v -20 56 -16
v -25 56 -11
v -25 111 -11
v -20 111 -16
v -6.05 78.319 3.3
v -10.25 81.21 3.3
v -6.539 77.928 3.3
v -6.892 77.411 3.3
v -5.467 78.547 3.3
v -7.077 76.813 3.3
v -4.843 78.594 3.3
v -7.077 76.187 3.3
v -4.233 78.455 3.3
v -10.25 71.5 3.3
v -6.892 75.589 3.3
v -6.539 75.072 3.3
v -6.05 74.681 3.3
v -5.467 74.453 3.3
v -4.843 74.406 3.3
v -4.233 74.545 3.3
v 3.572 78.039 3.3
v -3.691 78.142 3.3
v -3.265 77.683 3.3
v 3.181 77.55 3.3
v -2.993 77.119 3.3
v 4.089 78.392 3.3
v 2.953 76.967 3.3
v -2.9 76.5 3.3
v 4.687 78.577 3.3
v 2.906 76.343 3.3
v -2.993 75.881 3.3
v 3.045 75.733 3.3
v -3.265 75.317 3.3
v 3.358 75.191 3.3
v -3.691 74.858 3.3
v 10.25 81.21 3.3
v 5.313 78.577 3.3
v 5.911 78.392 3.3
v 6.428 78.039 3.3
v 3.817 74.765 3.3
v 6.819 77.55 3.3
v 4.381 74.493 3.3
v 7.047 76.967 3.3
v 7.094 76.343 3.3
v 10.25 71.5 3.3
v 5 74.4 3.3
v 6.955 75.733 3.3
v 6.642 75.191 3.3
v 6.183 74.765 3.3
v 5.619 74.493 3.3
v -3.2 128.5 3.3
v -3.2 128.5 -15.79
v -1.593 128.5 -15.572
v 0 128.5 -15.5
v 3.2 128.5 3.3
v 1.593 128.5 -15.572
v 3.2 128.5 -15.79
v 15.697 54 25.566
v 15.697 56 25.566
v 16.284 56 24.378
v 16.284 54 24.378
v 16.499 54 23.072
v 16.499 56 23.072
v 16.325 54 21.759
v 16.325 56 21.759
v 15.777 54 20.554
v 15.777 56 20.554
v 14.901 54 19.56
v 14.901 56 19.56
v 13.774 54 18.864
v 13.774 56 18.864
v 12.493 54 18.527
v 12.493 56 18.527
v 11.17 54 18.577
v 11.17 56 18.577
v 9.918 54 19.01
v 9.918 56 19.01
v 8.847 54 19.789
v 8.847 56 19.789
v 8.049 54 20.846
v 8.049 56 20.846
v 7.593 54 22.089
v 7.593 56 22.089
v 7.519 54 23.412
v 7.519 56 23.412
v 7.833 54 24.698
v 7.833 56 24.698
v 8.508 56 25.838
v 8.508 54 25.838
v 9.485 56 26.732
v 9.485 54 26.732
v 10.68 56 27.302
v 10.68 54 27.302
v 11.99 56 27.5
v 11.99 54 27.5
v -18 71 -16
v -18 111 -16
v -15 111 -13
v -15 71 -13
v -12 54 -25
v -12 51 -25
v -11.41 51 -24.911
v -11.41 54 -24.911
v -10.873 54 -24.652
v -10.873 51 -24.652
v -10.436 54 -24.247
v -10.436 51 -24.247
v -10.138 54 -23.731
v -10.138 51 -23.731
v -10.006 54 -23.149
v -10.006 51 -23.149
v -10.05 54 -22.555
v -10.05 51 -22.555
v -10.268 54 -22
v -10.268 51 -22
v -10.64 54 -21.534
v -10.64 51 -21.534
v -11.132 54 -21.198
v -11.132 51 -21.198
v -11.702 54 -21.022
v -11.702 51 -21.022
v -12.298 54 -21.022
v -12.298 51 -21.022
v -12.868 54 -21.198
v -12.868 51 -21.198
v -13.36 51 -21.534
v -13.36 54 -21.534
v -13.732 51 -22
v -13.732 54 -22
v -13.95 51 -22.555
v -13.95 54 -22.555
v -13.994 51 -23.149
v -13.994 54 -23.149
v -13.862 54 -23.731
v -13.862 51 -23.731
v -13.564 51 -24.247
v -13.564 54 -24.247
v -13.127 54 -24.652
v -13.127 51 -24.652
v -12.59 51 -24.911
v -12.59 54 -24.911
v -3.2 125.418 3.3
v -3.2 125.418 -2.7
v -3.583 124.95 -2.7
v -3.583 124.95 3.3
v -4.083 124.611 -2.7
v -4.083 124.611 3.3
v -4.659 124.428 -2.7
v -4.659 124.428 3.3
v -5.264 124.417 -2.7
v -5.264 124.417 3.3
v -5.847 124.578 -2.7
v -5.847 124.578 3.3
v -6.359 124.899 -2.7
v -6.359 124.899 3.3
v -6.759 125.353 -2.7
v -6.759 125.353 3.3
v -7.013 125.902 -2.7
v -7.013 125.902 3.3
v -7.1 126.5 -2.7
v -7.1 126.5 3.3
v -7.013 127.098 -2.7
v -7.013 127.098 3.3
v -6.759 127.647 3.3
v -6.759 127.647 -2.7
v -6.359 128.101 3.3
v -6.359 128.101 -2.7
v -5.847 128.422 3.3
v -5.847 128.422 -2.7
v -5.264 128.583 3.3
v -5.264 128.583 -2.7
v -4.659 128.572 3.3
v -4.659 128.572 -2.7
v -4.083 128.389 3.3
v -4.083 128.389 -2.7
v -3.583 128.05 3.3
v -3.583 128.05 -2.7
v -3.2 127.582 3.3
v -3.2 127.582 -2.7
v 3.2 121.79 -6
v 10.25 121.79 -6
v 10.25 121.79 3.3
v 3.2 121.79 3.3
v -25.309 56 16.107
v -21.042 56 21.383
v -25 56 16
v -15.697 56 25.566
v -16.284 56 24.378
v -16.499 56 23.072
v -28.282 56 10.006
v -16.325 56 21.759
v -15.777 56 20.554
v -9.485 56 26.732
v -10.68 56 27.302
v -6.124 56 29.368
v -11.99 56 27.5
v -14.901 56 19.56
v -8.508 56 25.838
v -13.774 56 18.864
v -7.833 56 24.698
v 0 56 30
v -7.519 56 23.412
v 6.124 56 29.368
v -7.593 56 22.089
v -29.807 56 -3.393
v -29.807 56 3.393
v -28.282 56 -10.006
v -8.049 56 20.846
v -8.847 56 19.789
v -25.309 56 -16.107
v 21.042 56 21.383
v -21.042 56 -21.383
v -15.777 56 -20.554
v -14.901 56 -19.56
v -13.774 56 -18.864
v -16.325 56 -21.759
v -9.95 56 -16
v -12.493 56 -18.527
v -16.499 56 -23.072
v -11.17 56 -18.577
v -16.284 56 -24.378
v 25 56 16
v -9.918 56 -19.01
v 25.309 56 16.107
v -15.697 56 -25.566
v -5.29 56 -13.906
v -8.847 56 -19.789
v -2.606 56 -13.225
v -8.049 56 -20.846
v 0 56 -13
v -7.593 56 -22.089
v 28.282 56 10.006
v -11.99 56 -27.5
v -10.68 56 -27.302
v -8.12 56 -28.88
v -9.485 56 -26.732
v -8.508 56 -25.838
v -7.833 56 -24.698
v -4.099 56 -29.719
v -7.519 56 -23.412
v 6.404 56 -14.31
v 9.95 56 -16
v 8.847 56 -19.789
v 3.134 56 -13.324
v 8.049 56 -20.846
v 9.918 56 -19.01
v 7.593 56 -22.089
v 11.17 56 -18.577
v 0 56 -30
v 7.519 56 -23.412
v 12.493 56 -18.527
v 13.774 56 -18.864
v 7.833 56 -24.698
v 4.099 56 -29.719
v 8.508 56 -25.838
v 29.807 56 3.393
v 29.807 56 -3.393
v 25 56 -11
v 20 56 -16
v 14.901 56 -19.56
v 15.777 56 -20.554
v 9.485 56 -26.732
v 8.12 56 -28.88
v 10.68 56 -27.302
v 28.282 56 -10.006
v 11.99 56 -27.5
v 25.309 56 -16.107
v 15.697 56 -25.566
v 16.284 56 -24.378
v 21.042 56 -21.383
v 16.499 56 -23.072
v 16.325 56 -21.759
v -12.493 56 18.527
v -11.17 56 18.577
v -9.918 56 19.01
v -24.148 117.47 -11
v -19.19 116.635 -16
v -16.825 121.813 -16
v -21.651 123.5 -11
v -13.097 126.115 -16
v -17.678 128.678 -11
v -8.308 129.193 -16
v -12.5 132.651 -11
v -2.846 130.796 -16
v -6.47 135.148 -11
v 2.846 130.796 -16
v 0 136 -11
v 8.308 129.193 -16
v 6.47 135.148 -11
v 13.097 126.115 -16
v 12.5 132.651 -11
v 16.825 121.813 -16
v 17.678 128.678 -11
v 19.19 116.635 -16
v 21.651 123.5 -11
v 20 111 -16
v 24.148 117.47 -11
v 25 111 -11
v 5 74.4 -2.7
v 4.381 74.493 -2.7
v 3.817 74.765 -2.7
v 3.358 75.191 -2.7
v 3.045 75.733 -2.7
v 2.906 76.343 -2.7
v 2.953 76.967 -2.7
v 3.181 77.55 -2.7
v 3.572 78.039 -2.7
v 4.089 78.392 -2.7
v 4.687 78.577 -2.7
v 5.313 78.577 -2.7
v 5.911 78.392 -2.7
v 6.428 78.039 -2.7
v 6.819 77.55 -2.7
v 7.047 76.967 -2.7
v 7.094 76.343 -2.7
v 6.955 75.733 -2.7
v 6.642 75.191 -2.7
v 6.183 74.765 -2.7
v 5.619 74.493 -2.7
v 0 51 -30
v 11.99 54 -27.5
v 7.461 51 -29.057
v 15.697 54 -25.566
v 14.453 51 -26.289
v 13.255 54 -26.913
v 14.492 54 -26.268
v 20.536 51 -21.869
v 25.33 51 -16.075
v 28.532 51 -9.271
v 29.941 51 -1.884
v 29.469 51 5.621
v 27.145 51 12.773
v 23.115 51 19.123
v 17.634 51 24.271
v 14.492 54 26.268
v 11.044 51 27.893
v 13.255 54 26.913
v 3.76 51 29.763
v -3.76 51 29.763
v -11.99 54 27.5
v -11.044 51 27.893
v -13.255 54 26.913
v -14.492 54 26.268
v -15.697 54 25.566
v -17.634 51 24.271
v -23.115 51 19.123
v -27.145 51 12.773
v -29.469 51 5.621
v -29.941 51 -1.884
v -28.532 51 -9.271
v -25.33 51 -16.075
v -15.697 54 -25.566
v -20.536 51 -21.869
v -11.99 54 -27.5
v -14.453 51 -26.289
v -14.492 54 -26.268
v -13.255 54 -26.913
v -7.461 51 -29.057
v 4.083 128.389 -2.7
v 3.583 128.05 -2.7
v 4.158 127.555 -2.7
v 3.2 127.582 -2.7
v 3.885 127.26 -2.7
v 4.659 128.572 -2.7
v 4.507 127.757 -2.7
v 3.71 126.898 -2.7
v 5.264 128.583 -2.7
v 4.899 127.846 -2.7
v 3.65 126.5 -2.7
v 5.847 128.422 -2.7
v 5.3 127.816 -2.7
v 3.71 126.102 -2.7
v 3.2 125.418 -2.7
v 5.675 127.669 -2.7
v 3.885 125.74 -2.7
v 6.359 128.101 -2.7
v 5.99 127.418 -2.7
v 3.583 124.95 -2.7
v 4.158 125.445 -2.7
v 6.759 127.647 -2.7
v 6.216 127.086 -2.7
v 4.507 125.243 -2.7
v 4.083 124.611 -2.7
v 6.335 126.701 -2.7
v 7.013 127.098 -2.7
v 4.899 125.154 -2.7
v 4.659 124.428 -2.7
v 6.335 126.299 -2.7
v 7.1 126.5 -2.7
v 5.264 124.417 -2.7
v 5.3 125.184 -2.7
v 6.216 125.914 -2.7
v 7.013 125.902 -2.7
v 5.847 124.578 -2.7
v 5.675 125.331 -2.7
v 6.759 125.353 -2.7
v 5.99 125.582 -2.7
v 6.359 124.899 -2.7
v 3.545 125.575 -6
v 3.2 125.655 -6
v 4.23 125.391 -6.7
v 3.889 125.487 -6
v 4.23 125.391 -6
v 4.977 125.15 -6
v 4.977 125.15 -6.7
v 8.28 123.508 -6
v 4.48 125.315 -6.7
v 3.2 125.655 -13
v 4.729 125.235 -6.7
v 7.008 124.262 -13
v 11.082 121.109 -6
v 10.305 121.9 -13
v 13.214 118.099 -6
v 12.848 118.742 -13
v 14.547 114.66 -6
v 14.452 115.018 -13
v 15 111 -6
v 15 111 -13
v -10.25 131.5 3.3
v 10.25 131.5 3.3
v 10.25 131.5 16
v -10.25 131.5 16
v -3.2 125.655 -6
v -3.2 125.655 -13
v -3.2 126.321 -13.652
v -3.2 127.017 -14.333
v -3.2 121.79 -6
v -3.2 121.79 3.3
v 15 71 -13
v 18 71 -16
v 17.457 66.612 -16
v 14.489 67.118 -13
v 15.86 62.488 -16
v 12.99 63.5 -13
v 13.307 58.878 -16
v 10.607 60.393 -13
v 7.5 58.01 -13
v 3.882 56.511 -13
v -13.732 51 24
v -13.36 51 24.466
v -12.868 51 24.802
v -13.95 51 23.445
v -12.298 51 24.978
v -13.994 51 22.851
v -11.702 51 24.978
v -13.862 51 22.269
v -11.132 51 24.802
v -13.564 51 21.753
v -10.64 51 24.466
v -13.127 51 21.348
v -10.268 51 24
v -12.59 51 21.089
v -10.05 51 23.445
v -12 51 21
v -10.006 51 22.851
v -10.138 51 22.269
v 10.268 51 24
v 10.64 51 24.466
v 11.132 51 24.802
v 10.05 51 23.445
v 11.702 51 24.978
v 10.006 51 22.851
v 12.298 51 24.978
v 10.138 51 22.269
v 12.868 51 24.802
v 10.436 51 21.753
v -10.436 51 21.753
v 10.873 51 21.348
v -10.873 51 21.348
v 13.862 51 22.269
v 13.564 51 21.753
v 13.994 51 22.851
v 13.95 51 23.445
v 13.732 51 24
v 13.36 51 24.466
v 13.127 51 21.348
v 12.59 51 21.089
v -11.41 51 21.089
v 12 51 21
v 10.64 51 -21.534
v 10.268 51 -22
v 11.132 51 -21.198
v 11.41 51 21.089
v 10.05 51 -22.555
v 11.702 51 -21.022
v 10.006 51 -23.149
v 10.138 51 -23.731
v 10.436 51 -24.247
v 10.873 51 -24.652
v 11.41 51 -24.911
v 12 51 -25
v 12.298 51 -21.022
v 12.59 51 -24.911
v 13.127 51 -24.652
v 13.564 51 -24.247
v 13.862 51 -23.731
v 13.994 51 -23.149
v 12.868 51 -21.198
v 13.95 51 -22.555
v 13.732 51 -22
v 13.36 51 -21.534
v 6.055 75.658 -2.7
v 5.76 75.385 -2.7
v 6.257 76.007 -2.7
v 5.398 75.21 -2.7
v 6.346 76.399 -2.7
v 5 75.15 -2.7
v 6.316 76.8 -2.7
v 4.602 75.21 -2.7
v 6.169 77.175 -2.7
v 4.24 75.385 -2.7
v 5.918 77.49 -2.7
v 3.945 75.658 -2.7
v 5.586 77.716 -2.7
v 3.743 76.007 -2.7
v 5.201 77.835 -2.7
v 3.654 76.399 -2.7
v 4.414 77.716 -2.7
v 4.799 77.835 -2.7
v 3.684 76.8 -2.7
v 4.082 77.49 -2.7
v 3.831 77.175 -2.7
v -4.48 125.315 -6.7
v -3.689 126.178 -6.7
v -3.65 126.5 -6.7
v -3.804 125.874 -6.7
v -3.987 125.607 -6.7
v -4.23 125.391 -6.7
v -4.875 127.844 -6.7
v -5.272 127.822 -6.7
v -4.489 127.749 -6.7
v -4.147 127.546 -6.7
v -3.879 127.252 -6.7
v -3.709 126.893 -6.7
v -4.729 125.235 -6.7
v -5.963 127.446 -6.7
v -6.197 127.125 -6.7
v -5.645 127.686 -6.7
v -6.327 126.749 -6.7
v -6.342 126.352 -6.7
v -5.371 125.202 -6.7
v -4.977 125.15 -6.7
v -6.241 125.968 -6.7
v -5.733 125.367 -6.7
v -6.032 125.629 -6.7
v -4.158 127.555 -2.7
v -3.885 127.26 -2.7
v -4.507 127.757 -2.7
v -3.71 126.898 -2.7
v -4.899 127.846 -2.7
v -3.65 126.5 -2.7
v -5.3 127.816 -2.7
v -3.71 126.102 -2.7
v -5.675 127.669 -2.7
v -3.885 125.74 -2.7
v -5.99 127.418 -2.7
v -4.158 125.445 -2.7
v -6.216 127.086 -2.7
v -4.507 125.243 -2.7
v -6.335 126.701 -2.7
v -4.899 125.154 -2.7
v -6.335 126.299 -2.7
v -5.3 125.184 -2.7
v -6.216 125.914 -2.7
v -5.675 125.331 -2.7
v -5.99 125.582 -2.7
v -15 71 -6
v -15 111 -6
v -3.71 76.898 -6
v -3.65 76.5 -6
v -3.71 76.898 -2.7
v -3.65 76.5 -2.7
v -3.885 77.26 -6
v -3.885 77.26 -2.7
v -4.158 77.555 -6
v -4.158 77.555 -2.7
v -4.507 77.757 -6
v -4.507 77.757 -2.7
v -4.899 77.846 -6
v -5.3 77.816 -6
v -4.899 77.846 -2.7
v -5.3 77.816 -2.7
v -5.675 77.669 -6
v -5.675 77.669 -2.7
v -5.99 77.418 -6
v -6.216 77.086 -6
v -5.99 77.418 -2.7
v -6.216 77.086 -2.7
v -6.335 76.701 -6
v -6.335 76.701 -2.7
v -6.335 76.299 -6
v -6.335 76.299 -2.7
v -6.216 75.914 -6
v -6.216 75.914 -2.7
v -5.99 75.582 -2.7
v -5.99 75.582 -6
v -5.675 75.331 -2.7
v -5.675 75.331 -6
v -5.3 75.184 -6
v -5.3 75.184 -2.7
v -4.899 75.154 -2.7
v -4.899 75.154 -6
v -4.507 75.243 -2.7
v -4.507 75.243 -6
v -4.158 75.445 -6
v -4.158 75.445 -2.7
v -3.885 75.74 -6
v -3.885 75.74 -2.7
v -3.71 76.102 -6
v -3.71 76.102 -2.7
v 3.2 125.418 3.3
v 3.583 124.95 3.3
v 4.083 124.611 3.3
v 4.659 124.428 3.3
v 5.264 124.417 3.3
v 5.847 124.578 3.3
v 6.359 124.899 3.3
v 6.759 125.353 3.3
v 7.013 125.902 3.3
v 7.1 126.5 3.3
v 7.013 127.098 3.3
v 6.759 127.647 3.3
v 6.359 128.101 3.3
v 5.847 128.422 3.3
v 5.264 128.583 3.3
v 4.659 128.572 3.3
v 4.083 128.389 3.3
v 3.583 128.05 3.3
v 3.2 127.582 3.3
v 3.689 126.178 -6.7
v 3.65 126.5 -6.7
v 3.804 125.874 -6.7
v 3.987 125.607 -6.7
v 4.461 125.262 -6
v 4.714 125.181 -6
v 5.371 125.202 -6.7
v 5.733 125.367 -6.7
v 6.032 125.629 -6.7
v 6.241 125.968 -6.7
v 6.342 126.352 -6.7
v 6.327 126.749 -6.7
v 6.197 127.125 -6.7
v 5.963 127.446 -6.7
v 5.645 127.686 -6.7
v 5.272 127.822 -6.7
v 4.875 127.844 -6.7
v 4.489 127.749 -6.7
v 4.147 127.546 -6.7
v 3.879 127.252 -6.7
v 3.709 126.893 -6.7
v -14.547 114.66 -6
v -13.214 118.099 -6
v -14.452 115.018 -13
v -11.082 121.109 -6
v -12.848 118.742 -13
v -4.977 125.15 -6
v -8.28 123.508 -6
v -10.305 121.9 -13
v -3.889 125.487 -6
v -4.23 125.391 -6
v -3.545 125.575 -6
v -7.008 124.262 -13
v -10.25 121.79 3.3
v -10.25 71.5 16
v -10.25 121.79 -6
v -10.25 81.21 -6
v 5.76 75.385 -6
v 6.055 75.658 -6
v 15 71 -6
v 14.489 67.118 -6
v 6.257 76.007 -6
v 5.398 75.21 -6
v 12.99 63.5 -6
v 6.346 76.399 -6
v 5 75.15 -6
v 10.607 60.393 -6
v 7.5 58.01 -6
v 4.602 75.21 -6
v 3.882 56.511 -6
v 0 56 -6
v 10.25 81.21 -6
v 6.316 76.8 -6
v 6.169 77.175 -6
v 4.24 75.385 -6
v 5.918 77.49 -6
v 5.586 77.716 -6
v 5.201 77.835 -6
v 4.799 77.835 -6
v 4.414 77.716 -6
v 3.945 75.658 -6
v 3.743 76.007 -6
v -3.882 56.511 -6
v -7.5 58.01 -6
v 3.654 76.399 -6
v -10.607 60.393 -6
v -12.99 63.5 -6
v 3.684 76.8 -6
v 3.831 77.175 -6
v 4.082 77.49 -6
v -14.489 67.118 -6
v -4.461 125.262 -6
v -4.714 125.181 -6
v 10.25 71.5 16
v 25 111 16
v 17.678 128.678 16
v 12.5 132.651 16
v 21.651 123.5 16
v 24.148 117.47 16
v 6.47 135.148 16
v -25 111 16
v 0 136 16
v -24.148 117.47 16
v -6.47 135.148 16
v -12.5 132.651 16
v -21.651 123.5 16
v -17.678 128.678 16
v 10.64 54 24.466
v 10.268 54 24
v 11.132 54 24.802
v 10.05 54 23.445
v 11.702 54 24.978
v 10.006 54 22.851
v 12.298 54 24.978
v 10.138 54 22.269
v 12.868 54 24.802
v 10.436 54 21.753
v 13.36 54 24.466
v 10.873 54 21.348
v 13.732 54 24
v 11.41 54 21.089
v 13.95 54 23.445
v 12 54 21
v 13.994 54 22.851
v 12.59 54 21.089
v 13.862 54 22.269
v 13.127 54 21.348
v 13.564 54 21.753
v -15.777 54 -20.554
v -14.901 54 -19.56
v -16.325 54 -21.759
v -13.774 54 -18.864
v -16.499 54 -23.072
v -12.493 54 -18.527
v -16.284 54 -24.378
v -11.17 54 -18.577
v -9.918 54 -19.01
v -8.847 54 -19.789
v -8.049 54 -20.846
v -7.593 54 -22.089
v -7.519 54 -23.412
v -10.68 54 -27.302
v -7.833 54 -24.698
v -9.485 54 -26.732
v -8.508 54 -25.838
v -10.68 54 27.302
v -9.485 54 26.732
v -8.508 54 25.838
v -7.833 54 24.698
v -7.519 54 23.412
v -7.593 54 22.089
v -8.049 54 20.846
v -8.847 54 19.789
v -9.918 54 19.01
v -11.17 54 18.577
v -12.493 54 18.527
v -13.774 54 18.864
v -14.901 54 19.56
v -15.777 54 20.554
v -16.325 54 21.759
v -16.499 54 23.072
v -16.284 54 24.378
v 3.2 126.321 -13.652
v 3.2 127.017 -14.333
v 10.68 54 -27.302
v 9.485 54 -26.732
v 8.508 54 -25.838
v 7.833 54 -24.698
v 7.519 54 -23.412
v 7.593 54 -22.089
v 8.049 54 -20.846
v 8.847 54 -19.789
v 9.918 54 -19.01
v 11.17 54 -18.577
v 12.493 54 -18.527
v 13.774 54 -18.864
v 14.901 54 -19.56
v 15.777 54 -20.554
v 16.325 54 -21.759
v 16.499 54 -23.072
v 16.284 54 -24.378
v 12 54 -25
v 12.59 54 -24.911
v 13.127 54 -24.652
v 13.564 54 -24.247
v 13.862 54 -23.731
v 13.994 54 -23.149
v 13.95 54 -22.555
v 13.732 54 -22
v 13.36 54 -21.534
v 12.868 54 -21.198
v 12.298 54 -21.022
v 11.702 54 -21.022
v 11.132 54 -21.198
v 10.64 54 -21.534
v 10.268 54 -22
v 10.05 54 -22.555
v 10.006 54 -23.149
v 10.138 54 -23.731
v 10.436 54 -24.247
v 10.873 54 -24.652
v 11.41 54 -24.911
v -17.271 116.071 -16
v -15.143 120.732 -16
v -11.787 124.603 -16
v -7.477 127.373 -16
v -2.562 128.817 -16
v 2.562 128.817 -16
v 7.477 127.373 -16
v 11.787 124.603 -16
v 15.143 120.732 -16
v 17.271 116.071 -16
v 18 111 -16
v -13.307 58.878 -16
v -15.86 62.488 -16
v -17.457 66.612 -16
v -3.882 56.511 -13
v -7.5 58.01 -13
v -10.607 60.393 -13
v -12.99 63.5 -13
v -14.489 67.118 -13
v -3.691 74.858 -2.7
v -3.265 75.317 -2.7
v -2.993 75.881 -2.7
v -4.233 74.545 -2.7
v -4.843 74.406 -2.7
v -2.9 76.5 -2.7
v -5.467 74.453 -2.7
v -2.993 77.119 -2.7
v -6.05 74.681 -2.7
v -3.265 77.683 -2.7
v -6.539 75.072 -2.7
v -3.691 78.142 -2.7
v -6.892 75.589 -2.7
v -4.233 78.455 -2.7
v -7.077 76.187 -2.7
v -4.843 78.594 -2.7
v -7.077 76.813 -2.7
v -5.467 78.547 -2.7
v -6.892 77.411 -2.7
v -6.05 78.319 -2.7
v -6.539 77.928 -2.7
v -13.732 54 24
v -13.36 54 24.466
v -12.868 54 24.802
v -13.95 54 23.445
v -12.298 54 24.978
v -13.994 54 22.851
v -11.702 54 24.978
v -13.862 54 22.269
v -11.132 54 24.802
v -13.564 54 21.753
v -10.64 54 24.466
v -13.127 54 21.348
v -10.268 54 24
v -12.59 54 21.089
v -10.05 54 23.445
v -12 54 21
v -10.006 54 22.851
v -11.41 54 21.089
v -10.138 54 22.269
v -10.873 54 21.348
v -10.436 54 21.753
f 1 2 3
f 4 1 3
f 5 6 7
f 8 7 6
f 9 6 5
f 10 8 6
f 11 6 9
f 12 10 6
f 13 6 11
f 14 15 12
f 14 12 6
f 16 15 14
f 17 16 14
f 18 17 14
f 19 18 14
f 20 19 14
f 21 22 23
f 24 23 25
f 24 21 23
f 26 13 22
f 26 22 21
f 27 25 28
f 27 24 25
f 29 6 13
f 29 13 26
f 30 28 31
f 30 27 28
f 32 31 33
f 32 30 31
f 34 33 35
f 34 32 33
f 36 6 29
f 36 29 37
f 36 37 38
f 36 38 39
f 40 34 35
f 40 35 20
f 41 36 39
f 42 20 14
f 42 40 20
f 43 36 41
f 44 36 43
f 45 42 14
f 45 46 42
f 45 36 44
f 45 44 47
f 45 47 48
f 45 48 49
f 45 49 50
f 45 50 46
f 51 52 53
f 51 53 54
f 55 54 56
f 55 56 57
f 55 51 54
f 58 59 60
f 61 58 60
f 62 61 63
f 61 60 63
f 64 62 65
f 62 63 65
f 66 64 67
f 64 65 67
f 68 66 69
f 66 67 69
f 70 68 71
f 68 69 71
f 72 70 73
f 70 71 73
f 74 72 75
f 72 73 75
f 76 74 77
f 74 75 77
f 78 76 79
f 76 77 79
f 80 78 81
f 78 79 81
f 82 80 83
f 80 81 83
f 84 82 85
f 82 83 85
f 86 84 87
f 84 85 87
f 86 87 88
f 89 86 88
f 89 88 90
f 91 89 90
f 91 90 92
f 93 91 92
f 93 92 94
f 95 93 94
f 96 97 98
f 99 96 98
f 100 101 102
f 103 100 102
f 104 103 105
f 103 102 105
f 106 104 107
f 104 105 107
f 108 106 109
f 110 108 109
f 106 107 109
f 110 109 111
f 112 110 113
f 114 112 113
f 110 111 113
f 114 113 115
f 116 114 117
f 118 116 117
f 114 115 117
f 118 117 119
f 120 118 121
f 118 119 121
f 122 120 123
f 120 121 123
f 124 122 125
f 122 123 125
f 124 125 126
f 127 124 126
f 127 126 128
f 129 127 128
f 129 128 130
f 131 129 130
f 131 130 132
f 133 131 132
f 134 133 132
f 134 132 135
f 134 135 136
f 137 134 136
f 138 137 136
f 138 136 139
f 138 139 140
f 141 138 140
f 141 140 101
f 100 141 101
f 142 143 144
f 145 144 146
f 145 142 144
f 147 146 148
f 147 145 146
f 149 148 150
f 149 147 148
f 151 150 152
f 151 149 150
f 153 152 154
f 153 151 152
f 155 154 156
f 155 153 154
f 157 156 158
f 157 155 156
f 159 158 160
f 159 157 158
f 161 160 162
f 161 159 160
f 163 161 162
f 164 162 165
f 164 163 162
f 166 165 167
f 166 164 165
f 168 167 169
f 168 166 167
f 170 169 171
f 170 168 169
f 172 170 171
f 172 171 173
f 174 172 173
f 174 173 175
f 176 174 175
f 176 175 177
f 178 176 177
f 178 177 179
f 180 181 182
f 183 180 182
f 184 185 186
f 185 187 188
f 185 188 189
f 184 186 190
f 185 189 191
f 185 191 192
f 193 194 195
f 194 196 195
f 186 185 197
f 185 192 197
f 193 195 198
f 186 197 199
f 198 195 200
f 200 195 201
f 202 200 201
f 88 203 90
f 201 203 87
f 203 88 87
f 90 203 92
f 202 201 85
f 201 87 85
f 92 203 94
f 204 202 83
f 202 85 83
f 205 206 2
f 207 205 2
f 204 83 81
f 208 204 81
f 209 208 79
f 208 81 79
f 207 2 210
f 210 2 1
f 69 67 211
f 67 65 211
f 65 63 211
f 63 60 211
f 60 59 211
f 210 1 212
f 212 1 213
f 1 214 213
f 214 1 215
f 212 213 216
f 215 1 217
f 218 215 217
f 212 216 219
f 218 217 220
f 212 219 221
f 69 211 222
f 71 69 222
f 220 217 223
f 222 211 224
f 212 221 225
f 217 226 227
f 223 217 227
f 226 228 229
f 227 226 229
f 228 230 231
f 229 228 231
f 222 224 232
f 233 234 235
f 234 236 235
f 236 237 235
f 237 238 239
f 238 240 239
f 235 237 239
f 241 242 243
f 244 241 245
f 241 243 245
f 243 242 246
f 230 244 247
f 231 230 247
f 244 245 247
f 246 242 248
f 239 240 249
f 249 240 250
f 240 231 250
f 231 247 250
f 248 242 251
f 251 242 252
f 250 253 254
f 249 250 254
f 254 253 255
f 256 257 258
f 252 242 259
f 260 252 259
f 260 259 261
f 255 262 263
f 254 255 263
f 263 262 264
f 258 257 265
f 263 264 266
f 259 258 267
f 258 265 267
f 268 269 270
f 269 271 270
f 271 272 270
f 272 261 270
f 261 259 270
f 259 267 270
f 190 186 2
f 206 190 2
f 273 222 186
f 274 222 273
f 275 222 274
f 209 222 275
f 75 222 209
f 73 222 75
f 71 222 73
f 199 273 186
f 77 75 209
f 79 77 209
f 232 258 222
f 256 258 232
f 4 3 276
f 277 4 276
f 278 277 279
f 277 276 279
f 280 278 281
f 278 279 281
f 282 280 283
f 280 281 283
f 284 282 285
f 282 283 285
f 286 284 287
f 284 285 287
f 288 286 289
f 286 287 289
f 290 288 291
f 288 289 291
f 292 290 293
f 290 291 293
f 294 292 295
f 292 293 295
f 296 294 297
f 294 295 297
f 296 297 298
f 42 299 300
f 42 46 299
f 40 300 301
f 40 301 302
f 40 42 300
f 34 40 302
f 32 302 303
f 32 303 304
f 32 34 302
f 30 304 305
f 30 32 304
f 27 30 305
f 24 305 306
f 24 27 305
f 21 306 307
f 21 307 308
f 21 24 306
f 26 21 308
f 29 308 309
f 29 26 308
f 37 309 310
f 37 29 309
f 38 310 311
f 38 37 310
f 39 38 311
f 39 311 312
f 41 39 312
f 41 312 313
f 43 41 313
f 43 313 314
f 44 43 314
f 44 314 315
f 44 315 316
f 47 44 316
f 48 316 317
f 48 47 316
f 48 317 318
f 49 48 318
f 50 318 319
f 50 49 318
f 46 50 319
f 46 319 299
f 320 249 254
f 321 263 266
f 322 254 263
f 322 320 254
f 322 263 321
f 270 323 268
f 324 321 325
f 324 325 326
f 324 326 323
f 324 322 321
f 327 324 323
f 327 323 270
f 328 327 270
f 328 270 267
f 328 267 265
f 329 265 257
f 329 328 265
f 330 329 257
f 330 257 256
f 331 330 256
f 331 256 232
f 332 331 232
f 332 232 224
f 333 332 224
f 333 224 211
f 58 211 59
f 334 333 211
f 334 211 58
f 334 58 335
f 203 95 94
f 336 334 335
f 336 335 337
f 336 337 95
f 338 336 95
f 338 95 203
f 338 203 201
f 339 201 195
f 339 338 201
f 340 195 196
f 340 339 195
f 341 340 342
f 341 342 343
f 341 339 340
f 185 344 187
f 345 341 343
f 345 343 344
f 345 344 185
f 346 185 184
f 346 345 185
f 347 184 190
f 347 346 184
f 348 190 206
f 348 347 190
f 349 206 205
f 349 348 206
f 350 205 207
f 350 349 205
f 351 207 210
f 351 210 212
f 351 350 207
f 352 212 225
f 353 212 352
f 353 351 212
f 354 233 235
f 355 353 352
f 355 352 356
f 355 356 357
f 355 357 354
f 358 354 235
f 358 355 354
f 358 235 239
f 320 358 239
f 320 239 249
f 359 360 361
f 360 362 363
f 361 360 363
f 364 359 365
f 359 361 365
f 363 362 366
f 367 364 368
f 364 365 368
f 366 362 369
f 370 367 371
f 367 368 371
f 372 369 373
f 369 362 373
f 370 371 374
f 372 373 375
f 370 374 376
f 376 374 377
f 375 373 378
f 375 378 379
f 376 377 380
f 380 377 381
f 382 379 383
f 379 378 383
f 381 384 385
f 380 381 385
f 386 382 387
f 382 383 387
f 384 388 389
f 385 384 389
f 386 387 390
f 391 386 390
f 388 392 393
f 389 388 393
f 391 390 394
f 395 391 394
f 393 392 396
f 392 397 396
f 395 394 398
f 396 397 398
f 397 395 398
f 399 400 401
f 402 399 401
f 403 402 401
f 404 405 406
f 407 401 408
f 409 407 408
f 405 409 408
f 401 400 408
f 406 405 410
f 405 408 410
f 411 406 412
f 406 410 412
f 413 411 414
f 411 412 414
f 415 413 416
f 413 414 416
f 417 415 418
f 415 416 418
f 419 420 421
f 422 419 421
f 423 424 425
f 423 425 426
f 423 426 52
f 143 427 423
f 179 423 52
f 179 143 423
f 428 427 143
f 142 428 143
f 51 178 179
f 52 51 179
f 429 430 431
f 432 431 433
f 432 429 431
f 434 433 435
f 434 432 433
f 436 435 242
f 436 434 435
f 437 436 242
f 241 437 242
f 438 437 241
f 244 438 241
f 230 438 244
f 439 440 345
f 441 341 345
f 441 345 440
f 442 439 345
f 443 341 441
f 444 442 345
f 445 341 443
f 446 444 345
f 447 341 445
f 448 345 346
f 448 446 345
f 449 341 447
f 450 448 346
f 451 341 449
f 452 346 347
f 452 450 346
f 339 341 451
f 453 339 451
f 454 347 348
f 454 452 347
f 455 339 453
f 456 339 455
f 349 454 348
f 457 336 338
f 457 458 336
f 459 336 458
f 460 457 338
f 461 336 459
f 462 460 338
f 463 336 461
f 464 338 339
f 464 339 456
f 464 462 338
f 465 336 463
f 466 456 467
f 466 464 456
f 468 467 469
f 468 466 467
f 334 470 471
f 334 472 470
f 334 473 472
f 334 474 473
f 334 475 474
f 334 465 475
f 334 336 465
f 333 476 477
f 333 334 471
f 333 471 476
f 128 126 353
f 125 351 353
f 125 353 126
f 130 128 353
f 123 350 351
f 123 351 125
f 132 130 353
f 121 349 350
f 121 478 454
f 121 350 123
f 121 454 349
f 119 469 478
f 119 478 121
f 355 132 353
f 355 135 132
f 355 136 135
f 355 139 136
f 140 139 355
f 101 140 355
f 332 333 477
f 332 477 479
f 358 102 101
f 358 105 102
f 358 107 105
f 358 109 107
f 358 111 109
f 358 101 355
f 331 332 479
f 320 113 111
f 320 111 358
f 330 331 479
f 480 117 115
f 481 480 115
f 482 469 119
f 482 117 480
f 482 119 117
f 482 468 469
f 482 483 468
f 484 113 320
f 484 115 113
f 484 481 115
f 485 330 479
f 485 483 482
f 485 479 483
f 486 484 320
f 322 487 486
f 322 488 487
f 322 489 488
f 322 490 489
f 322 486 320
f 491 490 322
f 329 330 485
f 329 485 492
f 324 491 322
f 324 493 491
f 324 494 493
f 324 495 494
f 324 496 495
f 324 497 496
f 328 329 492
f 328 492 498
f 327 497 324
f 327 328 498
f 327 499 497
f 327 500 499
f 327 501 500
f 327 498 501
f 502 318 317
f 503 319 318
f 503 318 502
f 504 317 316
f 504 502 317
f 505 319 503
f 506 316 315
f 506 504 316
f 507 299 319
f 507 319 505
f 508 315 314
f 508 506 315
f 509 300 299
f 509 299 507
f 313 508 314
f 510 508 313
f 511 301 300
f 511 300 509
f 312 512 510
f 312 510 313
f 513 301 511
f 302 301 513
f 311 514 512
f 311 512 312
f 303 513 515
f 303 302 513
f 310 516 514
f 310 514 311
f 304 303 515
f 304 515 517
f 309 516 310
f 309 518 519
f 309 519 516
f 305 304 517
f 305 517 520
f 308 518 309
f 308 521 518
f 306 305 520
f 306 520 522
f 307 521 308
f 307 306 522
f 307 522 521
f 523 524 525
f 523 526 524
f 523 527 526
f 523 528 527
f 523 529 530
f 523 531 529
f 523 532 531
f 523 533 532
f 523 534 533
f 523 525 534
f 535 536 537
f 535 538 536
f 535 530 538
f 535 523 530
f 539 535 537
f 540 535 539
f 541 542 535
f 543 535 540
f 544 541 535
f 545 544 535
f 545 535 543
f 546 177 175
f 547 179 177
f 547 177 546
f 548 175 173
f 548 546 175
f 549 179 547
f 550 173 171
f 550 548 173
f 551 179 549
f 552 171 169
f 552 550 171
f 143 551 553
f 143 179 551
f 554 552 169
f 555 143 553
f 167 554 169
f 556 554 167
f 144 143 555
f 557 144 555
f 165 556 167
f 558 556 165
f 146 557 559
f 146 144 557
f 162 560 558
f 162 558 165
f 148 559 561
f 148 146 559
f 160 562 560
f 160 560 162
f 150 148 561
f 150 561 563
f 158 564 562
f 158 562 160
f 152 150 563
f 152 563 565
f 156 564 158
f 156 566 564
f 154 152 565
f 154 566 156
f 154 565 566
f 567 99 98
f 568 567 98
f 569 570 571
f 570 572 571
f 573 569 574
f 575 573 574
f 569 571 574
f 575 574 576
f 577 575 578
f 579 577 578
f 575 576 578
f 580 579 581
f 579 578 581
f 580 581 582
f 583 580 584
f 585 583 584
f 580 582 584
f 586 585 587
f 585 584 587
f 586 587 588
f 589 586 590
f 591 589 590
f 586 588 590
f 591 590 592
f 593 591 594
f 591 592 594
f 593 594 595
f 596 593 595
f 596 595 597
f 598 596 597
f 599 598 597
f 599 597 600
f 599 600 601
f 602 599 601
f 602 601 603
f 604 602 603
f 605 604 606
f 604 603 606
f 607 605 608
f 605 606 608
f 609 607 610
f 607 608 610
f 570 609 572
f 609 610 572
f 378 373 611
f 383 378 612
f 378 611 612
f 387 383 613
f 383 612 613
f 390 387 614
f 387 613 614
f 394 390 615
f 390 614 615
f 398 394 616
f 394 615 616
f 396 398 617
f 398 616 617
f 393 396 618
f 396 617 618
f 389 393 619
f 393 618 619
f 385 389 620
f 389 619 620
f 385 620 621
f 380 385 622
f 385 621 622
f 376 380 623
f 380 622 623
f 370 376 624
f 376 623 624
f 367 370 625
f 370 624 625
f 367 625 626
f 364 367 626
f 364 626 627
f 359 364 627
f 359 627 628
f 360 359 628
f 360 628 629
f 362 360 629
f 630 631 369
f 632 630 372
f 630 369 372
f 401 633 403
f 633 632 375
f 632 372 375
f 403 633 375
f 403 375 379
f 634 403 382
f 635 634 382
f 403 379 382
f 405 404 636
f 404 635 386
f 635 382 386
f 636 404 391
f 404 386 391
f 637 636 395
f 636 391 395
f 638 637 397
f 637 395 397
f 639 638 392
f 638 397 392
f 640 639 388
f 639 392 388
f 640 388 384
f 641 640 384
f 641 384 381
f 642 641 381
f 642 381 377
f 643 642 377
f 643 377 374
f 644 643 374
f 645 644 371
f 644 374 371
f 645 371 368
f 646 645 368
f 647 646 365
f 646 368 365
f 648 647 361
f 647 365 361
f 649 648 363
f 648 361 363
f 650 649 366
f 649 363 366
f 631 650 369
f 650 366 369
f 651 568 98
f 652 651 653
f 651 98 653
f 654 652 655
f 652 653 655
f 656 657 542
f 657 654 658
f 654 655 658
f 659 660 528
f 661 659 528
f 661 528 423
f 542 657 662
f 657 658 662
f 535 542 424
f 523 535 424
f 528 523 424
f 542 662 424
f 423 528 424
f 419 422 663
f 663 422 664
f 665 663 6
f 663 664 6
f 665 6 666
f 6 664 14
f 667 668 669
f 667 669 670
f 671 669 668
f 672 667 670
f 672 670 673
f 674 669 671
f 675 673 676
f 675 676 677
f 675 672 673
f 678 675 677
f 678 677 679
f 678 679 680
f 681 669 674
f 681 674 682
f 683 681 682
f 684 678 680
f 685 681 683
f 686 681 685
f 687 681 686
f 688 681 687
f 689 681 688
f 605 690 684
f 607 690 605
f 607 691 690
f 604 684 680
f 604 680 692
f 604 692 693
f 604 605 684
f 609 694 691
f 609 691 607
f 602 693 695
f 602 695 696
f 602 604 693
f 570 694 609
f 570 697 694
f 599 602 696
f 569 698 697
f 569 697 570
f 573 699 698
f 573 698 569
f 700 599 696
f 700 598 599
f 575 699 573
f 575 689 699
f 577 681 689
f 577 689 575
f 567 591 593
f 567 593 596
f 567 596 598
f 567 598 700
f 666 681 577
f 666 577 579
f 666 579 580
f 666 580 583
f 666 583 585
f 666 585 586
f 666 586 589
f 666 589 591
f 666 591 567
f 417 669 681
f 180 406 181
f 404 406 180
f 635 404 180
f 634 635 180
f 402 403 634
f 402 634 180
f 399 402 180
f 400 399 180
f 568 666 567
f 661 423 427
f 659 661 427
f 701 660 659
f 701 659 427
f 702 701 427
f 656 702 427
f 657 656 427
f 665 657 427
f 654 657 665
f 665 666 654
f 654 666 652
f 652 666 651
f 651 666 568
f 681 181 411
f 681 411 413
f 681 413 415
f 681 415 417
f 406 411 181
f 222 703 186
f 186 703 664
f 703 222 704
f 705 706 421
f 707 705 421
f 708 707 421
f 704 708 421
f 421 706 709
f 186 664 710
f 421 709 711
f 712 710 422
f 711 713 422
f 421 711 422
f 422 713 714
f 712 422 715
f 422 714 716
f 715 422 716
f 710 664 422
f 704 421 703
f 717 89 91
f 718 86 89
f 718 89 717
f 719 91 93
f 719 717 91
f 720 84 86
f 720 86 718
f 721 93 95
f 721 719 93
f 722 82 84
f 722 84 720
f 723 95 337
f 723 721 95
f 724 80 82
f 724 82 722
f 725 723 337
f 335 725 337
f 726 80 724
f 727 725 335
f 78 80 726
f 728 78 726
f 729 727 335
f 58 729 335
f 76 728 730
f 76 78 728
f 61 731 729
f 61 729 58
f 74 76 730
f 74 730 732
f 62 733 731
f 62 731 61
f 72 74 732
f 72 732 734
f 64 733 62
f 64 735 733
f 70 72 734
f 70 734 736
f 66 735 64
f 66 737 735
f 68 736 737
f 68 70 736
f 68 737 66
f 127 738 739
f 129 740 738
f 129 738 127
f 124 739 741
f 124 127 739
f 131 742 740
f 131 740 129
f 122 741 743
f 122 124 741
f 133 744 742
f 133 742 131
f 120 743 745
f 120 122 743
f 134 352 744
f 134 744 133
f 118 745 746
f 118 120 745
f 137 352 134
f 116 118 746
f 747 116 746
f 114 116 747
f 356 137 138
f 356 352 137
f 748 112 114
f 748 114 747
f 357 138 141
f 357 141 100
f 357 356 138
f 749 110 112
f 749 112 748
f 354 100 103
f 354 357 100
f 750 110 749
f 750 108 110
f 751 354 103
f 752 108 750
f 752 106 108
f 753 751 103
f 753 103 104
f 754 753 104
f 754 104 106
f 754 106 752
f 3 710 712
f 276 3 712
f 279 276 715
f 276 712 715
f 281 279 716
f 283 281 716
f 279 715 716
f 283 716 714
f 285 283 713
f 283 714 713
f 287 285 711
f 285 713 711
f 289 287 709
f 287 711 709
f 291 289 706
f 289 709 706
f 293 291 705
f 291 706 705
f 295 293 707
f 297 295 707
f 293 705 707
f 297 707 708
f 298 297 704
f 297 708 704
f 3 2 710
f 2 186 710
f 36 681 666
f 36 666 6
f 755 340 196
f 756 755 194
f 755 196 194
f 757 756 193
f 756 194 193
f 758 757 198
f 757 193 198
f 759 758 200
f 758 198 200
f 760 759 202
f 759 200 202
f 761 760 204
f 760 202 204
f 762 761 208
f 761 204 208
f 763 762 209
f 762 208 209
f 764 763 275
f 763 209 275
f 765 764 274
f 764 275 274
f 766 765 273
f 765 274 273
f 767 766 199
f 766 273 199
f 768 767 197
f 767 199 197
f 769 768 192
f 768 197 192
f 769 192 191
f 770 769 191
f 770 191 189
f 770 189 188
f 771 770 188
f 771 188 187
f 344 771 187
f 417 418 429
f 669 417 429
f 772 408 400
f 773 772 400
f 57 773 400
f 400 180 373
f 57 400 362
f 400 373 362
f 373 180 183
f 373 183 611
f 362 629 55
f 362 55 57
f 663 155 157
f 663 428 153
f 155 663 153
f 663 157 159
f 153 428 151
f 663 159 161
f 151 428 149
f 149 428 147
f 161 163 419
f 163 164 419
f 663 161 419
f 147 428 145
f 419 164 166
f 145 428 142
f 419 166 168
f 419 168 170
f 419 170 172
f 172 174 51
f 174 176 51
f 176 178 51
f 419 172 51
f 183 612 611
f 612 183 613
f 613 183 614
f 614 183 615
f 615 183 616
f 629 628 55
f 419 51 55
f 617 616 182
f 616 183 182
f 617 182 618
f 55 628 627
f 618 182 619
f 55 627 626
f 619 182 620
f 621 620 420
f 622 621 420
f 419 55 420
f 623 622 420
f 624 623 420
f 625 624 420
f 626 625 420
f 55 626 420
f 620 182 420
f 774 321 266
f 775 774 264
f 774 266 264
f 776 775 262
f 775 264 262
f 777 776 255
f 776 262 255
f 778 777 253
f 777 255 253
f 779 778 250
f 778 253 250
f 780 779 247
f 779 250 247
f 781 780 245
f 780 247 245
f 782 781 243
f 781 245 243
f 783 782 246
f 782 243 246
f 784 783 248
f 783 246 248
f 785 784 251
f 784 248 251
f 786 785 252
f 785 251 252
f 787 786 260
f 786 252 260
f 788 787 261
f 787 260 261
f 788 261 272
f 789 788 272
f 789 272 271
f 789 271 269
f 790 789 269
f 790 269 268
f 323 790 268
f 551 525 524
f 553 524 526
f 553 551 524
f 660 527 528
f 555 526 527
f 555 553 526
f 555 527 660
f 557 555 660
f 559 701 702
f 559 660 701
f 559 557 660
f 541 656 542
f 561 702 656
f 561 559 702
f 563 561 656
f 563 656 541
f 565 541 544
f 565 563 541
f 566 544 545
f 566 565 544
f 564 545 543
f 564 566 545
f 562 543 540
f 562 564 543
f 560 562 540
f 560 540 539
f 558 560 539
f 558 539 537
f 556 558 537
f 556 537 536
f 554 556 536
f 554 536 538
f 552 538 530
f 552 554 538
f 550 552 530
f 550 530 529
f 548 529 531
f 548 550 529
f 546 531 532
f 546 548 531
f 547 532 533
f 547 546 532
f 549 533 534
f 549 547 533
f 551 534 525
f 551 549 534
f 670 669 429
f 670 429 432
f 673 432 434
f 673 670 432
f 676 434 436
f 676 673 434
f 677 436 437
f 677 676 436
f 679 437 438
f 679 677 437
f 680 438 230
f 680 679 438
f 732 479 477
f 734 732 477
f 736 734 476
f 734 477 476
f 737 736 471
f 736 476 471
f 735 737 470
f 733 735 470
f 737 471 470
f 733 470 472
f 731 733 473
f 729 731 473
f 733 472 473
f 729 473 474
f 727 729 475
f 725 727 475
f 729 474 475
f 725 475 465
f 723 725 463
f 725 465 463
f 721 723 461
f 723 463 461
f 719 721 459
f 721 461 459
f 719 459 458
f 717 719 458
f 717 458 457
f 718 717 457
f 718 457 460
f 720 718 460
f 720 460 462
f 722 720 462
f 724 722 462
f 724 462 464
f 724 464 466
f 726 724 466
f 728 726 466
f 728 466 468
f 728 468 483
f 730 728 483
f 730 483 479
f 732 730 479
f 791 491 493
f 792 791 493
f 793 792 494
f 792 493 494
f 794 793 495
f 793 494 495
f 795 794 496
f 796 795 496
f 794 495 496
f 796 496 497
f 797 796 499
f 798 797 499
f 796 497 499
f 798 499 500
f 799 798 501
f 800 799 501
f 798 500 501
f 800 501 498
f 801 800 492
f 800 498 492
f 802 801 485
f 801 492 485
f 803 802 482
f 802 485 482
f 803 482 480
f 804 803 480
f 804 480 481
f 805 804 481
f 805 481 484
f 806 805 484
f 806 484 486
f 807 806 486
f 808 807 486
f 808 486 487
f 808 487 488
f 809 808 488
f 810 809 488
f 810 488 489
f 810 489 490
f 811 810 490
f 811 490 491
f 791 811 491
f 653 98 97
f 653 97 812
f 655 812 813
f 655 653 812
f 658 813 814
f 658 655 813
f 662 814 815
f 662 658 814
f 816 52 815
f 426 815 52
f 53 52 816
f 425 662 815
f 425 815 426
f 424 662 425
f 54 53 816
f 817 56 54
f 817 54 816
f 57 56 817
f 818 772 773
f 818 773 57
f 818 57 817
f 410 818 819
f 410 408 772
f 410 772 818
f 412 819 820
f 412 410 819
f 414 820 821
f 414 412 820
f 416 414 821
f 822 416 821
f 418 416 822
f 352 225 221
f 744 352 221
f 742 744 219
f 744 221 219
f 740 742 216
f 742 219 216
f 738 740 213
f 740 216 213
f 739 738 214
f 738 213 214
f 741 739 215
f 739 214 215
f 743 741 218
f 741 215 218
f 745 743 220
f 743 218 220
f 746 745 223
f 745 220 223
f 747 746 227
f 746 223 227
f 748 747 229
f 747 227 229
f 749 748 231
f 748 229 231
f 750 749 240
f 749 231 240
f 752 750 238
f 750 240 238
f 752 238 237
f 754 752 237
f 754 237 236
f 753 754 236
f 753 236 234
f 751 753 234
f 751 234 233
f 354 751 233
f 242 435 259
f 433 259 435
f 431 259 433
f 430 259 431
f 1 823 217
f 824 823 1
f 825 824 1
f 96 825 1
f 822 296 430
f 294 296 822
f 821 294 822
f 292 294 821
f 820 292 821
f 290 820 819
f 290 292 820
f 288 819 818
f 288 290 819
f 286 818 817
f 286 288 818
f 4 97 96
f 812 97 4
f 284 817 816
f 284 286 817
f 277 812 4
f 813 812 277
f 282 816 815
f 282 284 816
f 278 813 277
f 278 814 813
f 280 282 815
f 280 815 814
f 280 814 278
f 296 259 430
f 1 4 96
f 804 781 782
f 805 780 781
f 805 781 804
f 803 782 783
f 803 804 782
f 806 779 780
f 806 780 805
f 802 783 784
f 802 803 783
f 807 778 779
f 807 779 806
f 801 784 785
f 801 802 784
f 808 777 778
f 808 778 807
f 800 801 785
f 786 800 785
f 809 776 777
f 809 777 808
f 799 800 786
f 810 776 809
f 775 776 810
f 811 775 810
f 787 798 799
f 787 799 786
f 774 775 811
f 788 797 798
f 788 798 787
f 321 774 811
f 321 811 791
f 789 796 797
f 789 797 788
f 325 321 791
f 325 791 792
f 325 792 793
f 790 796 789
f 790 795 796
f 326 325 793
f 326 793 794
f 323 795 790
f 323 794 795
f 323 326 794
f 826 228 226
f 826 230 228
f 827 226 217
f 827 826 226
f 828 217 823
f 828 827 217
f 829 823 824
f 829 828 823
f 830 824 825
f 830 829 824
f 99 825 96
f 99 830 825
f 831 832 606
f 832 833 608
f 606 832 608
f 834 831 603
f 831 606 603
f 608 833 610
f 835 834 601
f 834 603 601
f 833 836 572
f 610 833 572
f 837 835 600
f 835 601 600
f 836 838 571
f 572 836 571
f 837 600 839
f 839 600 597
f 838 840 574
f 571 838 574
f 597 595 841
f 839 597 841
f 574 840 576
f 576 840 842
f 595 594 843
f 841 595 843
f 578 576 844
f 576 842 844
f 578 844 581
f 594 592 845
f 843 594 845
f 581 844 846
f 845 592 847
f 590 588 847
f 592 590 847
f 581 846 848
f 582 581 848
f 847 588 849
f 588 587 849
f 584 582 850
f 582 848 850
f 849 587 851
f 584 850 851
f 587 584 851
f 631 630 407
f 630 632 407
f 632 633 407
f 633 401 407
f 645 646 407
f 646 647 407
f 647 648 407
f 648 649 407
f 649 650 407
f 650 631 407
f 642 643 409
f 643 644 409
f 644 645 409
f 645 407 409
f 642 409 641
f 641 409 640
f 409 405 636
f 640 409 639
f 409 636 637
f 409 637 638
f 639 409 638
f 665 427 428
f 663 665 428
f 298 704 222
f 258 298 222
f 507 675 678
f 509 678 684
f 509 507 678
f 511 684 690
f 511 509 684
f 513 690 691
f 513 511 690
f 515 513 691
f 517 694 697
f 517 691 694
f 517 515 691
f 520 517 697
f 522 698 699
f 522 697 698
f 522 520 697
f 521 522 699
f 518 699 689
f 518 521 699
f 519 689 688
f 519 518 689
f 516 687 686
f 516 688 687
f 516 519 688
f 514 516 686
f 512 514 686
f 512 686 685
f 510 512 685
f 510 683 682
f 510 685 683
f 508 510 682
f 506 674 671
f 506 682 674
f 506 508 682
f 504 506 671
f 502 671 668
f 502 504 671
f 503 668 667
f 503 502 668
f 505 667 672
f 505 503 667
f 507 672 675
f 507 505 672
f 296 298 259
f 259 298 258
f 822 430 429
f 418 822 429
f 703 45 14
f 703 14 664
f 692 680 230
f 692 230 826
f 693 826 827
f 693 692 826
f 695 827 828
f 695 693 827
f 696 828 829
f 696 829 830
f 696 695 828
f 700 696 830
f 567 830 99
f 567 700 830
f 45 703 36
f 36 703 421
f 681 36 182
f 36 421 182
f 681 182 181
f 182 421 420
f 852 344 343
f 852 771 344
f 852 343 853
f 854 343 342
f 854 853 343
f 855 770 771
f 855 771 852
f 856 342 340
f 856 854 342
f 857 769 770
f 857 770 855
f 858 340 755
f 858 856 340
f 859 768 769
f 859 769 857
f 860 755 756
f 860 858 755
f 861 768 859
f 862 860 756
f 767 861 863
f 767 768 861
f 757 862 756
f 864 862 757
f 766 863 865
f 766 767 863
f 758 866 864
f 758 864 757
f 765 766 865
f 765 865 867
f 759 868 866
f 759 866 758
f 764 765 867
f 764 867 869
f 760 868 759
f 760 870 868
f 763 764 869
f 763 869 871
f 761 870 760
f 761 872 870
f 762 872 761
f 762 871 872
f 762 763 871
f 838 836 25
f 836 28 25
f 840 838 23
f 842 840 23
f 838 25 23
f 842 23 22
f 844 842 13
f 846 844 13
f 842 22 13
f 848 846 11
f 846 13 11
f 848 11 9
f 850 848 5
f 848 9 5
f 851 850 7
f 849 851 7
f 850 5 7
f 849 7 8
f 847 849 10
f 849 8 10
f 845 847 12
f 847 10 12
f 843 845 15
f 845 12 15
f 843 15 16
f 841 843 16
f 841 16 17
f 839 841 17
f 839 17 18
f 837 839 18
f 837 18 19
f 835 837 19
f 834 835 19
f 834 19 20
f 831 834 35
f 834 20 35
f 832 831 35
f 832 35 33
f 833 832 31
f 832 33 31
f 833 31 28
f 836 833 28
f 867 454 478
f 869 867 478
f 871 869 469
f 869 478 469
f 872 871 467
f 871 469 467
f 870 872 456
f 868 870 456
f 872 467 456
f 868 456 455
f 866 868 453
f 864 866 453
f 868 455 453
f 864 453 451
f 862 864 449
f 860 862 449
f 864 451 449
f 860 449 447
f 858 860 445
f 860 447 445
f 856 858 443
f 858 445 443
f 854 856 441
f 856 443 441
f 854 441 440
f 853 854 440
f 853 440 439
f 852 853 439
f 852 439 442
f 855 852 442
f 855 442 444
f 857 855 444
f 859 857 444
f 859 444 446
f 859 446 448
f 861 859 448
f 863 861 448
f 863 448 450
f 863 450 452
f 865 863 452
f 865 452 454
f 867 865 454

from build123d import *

# Parameters (mm, degrees)
BOSS_EXTRUDE1_DEPTH = 16
CHAMFER1_SIZE       = 5
CUT_EXTRUDE1_DEPTH  = 10.25
SKETCH5_W           = 6.4
SKETCH5_H           = 6.71
CUT_EXTRUDE2_DEPTH  = 24
CUT_EXTRUDE3_DEPTH  = 10
FILLET1_R           = 15
CHAMFER2_SIZE       = 3
SKETCH7_R           = 30
SKETCH7_R_2         = 2
BOSS_EXTRUDE2_DEPTH = 5
SKETCH8_R           = 4.5
CUT_EXTRUDE4_DEPTH  = 2


# Some blends are built 0.0001 mm under size
with BuildPart() as part:
    # Sketch1 → Boss-Extrude1 (new, symmetric)
    with BuildSketch(Plane.XY):
        with BuildLine():
            Line((25, 51), (-25, 51))
            Line((-25, 51), (-25, 111))
            ThreePointArc((-25, 111), (0, 136), (25, 111))
            Line((25, 111), (25, 51))
        make_face()
    extrude(amount=BOSS_EXTRUDE1_DEPTH, both=True)

    # Chamfer1
    chamfer1_edges = [part.edges().sort_by_distance(p)[0] for p in [
        (25, 81, -16),
        (-25, 81, -16),
        (0, 136, -16),
    ]]
    chamfer(chamfer1_edges, length=CHAMFER1_SIZE)

    # Sketch3 → Cut-Extrude1 (cut, symmetric)
    with BuildSketch(Plane(origin=(0, 0, 0), x_dir=(0, 0, -1), z_dir=(1, 0, 0))):
        Polygon((-3.3, 121.79), (-3.3, 131.5), (-16, 131.5), (-16, 101.5), (16, 101.5), (16, 121.79), align=None)
    cut_extrude1 = extrude(amount=CUT_EXTRUDE1_DEPTH, both=True, mode=Mode.SUBTRACT)

    # Sketch4 → Cut-Revolve1 (revolve, cut)
    with BuildSketch(Plane(origin=(-5, 0, 0), x_dir=(0, 0, -1), z_dir=(1, 0, 0)), mode=Mode.PRIVATE) as cut_revolve1_sk:
        Polygon((-3.3, 126.5), (6.7, 126.5), (6.7, 127.85), (2.7, 127.85), (2.7, 128.6), (-3.3, 128.6), align=None)
    cut_revolve1 = revolve(cut_revolve1_sk.sketch.rotate(Axis((-5, 126.5, 3.3), (0, 0, -1)), 90), axis=Axis((-5, 126.5, 3.3), (0, 0, -1)), mode=Mode.SUBTRACT)

    # Mirror1: Cut-Revolve1 across plane
    add(cut_revolve1.mirror(Plane(origin=(0, 0, 0), x_dir=(0, 0, 1), z_dir=(1, 0, 0))), mode=Mode.SUBTRACT)

    # Mirror2: Cut-Extrude1, Cut-Revolve1 across plane
    add(cut_extrude1.mirror(Plane(origin=(-10.25, 101.5, -16), x_dir=(0, 0, 1), z_dir=(0, -1, 0))), mode=Mode.SUBTRACT)
    add(cut_revolve1.mirror(Plane(origin=(-10.25, 101.5, -16), x_dir=(0, 0, 1), z_dir=(0, -1, 0))), mode=Mode.SUBTRACT)

    # Mirror2 copy 1 sketch → Mirror2 copy 1 (revolve, cut)
    with BuildSketch(Plane(origin=(5, 203, 0), x_dir=(0, 0, -1), z_dir=(-1, 0, 0))):
        Polygon((-3.3, 126.5), (6.7, 126.5), (6.7, 127.85), (2.7, 127.85), (2.7, 128.6), (-3.3, 128.6), align=None)
    revolve(axis=Axis((5, 76.5, 3.3), (0, 0, -1)), mode=Mode.SUBTRACT)

    # Sketch5 → Cut-Extrude2 (cut)
    with BuildSketch(Plane.XY.offset(3.3)):
        with Locations((0, 125.145)):
            Rectangle(SKETCH5_W, SKETCH5_H)
    extrude(amount=-CUT_EXTRUDE2_DEPTH, mode=Mode.SUBTRACT)

    # Sketch6 → Cut-Extrude3 (cut)
    with BuildSketch(Plane(origin=(0, 0, -16), x_dir=(-1, 0, 0), z_dir=(0, 0, -1))):
        with BuildLine():
            Line((-15, 111), (-15, 56))
            Line((-15, 56), (15, 56))
            Line((15, 56), (15, 111))
            ThreePointArc((15, 111), (0, 126), (-15, 111))
        make_face()
    extrude(amount=-CUT_EXTRUDE3_DEPTH, mode=Mode.SUBTRACT)

    # Fillet1
    fillet1_edges = [part.edges().sort_by_distance(p)[0] for p in [
        (-15, 56, -11),
        (15, 56, -11),
    ]]
    fillet(fillet1_edges, radius=FILLET1_R - 0.0001)  # a hair under: the kernel refuses the full size

    # Chamfer2
    # the kernel refuses this chamfer: 3 mm, written as the material it takes off along each edge
    with BuildSketch(Plane(origin=(-15, 70.9999, -16), x_dir=(-0.9996219169112965, 0, -0.02749587661058676), z_dir=(0, 1, 0)), Plane(origin=(15, 111, -16), x_dir=(0.9996219169112965, 0, -0.02749587661058676), z_dir=(0, -1, 0))) as chamfer2_piece_1:
        Polygon((CHAMFER2_SIZE * 0.999621916911, CHAMFER2_SIZE * 0.0274958766106), (-CHAMFER2_SIZE * 0.0274958766106, CHAMFER2_SIZE * 0.999621916911), (0, 0), align=None)
    extrude(amount=40.0001, mode=Mode.SUBTRACT)
    with BuildSketch(Plane(origin=(-0.0001, 70.9999, -16), x_dir=(0, -1, 0), z_dir=(1, 0, 0))) as chamfer2_piece_2:
        Polygon((14.9999 + CHAMFER2_SIZE, 0), (14.9999, -CHAMFER2_SIZE), (14.9999, 0), align=None)
    revolve(axis=Axis((-0.0001, 70.9999, -16), (0, 0, -1)), revolution_arc=90, mode=Mode.SUBTRACT)
    with BuildSketch(Plane(origin=(0, 111, -16), x_dir=(-0.29504722278554535, 0.955482671913278, 0), z_dir=(-0.955482671913278, -0.29504722278554535, 0))) as chamfer2_piece_3:
        Polygon((15 + CHAMFER2_SIZE, 0), (15, -CHAMFER2_SIZE), (15, 0), align=None)
    revolve(axis=Axis((0, 111, -16), (0, 0, -1)), revolution_arc=107.160369077, mode=Mode.SUBTRACT)
    with BuildSketch(Plane(origin=(0.0001, 70.9999, -16), x_dir=(1, 0, 0), z_dir=(0, 1, 0))) as chamfer2_piece_4:
        Polygon((14.9999 + CHAMFER2_SIZE, 0), (14.9999, -CHAMFER2_SIZE), (14.9999, 0), align=None)
    revolve(axis=Axis((0.0001, 70.9999, -16), (0, 0, -1)), revolution_arc=90, mode=Mode.SUBTRACT)
    with BuildSketch(Plane(origin=(0.0001, 56, -16), x_dir=(0, -0.9996219169112965, -0.02749587661058676), z_dir=(-1, 0, 0))) as chamfer2_piece_5:
        Polygon((CHAMFER2_SIZE * 0.999621916911, CHAMFER2_SIZE * 0.0274958766106), (-CHAMFER2_SIZE * 0.0274958766106, CHAMFER2_SIZE * 0.999621916911), (0, 0), align=None)
    extrude(amount=0.0002, mode=Mode.SUBTRACT)
    with BuildSketch(Plane(origin=(0, 111, -16), x_dir=(-1, 0, 0), z_dir=(0, -1, 0))) as chamfer2_piece_6:
        Polygon((15 + CHAMFER2_SIZE, 0), (15, -CHAMFER2_SIZE), (15, 0), align=None)
    revolve(axis=Axis((0, 111, -16), (0, 0, -1)), revolution_arc=107.160369077, mode=Mode.SUBTRACT)

    # Sketch7 → Boss-Extrude2 (add)
    with BuildSketch(Plane.XZ.offset(-51)):
        with Locations(Location((0, 0, 0), (0, 0, 270))):
            Circle(SKETCH7_R)
        with Locations(Location((-12, -23, 0), (0, 0, 270))):
            Circle(SKETCH7_R_2, mode=Mode.SUBTRACT)
        with Locations(Location((12, -23, 0), (0, 0, 270))):
            Circle(SKETCH7_R_2, mode=Mode.SUBTRACT)
        with Locations(Location((-12, 23, 0), (0, 0, 270))):
            Circle(SKETCH7_R_2, mode=Mode.SUBTRACT)
        with Locations(Location((12, 23, 0), (0, 0, 270))):
            Circle(SKETCH7_R_2, mode=Mode.SUBTRACT)
    extrude(amount=-BOSS_EXTRUDE2_DEPTH)

    # Sketch8 → Cut-Extrude4 (cut)
    with BuildSketch(Plane(origin=(0, 56, 0), x_dir=(1, 0, 0), z_dir=(0, 1, 0))):
        with Locations((12, 23)):
            Circle(SKETCH8_R)
        with Locations((-12, 23)):
            Circle(SKETCH8_R)
        with Locations((-12, -23)):
            Circle(SKETCH8_R)
        with Locations((12, -23)):
            Circle(SKETCH8_R)
    extrude(amount=-CUT_EXTRUDE4_DEPTH, mode=Mode.SUBTRACT)


solid = part.part
